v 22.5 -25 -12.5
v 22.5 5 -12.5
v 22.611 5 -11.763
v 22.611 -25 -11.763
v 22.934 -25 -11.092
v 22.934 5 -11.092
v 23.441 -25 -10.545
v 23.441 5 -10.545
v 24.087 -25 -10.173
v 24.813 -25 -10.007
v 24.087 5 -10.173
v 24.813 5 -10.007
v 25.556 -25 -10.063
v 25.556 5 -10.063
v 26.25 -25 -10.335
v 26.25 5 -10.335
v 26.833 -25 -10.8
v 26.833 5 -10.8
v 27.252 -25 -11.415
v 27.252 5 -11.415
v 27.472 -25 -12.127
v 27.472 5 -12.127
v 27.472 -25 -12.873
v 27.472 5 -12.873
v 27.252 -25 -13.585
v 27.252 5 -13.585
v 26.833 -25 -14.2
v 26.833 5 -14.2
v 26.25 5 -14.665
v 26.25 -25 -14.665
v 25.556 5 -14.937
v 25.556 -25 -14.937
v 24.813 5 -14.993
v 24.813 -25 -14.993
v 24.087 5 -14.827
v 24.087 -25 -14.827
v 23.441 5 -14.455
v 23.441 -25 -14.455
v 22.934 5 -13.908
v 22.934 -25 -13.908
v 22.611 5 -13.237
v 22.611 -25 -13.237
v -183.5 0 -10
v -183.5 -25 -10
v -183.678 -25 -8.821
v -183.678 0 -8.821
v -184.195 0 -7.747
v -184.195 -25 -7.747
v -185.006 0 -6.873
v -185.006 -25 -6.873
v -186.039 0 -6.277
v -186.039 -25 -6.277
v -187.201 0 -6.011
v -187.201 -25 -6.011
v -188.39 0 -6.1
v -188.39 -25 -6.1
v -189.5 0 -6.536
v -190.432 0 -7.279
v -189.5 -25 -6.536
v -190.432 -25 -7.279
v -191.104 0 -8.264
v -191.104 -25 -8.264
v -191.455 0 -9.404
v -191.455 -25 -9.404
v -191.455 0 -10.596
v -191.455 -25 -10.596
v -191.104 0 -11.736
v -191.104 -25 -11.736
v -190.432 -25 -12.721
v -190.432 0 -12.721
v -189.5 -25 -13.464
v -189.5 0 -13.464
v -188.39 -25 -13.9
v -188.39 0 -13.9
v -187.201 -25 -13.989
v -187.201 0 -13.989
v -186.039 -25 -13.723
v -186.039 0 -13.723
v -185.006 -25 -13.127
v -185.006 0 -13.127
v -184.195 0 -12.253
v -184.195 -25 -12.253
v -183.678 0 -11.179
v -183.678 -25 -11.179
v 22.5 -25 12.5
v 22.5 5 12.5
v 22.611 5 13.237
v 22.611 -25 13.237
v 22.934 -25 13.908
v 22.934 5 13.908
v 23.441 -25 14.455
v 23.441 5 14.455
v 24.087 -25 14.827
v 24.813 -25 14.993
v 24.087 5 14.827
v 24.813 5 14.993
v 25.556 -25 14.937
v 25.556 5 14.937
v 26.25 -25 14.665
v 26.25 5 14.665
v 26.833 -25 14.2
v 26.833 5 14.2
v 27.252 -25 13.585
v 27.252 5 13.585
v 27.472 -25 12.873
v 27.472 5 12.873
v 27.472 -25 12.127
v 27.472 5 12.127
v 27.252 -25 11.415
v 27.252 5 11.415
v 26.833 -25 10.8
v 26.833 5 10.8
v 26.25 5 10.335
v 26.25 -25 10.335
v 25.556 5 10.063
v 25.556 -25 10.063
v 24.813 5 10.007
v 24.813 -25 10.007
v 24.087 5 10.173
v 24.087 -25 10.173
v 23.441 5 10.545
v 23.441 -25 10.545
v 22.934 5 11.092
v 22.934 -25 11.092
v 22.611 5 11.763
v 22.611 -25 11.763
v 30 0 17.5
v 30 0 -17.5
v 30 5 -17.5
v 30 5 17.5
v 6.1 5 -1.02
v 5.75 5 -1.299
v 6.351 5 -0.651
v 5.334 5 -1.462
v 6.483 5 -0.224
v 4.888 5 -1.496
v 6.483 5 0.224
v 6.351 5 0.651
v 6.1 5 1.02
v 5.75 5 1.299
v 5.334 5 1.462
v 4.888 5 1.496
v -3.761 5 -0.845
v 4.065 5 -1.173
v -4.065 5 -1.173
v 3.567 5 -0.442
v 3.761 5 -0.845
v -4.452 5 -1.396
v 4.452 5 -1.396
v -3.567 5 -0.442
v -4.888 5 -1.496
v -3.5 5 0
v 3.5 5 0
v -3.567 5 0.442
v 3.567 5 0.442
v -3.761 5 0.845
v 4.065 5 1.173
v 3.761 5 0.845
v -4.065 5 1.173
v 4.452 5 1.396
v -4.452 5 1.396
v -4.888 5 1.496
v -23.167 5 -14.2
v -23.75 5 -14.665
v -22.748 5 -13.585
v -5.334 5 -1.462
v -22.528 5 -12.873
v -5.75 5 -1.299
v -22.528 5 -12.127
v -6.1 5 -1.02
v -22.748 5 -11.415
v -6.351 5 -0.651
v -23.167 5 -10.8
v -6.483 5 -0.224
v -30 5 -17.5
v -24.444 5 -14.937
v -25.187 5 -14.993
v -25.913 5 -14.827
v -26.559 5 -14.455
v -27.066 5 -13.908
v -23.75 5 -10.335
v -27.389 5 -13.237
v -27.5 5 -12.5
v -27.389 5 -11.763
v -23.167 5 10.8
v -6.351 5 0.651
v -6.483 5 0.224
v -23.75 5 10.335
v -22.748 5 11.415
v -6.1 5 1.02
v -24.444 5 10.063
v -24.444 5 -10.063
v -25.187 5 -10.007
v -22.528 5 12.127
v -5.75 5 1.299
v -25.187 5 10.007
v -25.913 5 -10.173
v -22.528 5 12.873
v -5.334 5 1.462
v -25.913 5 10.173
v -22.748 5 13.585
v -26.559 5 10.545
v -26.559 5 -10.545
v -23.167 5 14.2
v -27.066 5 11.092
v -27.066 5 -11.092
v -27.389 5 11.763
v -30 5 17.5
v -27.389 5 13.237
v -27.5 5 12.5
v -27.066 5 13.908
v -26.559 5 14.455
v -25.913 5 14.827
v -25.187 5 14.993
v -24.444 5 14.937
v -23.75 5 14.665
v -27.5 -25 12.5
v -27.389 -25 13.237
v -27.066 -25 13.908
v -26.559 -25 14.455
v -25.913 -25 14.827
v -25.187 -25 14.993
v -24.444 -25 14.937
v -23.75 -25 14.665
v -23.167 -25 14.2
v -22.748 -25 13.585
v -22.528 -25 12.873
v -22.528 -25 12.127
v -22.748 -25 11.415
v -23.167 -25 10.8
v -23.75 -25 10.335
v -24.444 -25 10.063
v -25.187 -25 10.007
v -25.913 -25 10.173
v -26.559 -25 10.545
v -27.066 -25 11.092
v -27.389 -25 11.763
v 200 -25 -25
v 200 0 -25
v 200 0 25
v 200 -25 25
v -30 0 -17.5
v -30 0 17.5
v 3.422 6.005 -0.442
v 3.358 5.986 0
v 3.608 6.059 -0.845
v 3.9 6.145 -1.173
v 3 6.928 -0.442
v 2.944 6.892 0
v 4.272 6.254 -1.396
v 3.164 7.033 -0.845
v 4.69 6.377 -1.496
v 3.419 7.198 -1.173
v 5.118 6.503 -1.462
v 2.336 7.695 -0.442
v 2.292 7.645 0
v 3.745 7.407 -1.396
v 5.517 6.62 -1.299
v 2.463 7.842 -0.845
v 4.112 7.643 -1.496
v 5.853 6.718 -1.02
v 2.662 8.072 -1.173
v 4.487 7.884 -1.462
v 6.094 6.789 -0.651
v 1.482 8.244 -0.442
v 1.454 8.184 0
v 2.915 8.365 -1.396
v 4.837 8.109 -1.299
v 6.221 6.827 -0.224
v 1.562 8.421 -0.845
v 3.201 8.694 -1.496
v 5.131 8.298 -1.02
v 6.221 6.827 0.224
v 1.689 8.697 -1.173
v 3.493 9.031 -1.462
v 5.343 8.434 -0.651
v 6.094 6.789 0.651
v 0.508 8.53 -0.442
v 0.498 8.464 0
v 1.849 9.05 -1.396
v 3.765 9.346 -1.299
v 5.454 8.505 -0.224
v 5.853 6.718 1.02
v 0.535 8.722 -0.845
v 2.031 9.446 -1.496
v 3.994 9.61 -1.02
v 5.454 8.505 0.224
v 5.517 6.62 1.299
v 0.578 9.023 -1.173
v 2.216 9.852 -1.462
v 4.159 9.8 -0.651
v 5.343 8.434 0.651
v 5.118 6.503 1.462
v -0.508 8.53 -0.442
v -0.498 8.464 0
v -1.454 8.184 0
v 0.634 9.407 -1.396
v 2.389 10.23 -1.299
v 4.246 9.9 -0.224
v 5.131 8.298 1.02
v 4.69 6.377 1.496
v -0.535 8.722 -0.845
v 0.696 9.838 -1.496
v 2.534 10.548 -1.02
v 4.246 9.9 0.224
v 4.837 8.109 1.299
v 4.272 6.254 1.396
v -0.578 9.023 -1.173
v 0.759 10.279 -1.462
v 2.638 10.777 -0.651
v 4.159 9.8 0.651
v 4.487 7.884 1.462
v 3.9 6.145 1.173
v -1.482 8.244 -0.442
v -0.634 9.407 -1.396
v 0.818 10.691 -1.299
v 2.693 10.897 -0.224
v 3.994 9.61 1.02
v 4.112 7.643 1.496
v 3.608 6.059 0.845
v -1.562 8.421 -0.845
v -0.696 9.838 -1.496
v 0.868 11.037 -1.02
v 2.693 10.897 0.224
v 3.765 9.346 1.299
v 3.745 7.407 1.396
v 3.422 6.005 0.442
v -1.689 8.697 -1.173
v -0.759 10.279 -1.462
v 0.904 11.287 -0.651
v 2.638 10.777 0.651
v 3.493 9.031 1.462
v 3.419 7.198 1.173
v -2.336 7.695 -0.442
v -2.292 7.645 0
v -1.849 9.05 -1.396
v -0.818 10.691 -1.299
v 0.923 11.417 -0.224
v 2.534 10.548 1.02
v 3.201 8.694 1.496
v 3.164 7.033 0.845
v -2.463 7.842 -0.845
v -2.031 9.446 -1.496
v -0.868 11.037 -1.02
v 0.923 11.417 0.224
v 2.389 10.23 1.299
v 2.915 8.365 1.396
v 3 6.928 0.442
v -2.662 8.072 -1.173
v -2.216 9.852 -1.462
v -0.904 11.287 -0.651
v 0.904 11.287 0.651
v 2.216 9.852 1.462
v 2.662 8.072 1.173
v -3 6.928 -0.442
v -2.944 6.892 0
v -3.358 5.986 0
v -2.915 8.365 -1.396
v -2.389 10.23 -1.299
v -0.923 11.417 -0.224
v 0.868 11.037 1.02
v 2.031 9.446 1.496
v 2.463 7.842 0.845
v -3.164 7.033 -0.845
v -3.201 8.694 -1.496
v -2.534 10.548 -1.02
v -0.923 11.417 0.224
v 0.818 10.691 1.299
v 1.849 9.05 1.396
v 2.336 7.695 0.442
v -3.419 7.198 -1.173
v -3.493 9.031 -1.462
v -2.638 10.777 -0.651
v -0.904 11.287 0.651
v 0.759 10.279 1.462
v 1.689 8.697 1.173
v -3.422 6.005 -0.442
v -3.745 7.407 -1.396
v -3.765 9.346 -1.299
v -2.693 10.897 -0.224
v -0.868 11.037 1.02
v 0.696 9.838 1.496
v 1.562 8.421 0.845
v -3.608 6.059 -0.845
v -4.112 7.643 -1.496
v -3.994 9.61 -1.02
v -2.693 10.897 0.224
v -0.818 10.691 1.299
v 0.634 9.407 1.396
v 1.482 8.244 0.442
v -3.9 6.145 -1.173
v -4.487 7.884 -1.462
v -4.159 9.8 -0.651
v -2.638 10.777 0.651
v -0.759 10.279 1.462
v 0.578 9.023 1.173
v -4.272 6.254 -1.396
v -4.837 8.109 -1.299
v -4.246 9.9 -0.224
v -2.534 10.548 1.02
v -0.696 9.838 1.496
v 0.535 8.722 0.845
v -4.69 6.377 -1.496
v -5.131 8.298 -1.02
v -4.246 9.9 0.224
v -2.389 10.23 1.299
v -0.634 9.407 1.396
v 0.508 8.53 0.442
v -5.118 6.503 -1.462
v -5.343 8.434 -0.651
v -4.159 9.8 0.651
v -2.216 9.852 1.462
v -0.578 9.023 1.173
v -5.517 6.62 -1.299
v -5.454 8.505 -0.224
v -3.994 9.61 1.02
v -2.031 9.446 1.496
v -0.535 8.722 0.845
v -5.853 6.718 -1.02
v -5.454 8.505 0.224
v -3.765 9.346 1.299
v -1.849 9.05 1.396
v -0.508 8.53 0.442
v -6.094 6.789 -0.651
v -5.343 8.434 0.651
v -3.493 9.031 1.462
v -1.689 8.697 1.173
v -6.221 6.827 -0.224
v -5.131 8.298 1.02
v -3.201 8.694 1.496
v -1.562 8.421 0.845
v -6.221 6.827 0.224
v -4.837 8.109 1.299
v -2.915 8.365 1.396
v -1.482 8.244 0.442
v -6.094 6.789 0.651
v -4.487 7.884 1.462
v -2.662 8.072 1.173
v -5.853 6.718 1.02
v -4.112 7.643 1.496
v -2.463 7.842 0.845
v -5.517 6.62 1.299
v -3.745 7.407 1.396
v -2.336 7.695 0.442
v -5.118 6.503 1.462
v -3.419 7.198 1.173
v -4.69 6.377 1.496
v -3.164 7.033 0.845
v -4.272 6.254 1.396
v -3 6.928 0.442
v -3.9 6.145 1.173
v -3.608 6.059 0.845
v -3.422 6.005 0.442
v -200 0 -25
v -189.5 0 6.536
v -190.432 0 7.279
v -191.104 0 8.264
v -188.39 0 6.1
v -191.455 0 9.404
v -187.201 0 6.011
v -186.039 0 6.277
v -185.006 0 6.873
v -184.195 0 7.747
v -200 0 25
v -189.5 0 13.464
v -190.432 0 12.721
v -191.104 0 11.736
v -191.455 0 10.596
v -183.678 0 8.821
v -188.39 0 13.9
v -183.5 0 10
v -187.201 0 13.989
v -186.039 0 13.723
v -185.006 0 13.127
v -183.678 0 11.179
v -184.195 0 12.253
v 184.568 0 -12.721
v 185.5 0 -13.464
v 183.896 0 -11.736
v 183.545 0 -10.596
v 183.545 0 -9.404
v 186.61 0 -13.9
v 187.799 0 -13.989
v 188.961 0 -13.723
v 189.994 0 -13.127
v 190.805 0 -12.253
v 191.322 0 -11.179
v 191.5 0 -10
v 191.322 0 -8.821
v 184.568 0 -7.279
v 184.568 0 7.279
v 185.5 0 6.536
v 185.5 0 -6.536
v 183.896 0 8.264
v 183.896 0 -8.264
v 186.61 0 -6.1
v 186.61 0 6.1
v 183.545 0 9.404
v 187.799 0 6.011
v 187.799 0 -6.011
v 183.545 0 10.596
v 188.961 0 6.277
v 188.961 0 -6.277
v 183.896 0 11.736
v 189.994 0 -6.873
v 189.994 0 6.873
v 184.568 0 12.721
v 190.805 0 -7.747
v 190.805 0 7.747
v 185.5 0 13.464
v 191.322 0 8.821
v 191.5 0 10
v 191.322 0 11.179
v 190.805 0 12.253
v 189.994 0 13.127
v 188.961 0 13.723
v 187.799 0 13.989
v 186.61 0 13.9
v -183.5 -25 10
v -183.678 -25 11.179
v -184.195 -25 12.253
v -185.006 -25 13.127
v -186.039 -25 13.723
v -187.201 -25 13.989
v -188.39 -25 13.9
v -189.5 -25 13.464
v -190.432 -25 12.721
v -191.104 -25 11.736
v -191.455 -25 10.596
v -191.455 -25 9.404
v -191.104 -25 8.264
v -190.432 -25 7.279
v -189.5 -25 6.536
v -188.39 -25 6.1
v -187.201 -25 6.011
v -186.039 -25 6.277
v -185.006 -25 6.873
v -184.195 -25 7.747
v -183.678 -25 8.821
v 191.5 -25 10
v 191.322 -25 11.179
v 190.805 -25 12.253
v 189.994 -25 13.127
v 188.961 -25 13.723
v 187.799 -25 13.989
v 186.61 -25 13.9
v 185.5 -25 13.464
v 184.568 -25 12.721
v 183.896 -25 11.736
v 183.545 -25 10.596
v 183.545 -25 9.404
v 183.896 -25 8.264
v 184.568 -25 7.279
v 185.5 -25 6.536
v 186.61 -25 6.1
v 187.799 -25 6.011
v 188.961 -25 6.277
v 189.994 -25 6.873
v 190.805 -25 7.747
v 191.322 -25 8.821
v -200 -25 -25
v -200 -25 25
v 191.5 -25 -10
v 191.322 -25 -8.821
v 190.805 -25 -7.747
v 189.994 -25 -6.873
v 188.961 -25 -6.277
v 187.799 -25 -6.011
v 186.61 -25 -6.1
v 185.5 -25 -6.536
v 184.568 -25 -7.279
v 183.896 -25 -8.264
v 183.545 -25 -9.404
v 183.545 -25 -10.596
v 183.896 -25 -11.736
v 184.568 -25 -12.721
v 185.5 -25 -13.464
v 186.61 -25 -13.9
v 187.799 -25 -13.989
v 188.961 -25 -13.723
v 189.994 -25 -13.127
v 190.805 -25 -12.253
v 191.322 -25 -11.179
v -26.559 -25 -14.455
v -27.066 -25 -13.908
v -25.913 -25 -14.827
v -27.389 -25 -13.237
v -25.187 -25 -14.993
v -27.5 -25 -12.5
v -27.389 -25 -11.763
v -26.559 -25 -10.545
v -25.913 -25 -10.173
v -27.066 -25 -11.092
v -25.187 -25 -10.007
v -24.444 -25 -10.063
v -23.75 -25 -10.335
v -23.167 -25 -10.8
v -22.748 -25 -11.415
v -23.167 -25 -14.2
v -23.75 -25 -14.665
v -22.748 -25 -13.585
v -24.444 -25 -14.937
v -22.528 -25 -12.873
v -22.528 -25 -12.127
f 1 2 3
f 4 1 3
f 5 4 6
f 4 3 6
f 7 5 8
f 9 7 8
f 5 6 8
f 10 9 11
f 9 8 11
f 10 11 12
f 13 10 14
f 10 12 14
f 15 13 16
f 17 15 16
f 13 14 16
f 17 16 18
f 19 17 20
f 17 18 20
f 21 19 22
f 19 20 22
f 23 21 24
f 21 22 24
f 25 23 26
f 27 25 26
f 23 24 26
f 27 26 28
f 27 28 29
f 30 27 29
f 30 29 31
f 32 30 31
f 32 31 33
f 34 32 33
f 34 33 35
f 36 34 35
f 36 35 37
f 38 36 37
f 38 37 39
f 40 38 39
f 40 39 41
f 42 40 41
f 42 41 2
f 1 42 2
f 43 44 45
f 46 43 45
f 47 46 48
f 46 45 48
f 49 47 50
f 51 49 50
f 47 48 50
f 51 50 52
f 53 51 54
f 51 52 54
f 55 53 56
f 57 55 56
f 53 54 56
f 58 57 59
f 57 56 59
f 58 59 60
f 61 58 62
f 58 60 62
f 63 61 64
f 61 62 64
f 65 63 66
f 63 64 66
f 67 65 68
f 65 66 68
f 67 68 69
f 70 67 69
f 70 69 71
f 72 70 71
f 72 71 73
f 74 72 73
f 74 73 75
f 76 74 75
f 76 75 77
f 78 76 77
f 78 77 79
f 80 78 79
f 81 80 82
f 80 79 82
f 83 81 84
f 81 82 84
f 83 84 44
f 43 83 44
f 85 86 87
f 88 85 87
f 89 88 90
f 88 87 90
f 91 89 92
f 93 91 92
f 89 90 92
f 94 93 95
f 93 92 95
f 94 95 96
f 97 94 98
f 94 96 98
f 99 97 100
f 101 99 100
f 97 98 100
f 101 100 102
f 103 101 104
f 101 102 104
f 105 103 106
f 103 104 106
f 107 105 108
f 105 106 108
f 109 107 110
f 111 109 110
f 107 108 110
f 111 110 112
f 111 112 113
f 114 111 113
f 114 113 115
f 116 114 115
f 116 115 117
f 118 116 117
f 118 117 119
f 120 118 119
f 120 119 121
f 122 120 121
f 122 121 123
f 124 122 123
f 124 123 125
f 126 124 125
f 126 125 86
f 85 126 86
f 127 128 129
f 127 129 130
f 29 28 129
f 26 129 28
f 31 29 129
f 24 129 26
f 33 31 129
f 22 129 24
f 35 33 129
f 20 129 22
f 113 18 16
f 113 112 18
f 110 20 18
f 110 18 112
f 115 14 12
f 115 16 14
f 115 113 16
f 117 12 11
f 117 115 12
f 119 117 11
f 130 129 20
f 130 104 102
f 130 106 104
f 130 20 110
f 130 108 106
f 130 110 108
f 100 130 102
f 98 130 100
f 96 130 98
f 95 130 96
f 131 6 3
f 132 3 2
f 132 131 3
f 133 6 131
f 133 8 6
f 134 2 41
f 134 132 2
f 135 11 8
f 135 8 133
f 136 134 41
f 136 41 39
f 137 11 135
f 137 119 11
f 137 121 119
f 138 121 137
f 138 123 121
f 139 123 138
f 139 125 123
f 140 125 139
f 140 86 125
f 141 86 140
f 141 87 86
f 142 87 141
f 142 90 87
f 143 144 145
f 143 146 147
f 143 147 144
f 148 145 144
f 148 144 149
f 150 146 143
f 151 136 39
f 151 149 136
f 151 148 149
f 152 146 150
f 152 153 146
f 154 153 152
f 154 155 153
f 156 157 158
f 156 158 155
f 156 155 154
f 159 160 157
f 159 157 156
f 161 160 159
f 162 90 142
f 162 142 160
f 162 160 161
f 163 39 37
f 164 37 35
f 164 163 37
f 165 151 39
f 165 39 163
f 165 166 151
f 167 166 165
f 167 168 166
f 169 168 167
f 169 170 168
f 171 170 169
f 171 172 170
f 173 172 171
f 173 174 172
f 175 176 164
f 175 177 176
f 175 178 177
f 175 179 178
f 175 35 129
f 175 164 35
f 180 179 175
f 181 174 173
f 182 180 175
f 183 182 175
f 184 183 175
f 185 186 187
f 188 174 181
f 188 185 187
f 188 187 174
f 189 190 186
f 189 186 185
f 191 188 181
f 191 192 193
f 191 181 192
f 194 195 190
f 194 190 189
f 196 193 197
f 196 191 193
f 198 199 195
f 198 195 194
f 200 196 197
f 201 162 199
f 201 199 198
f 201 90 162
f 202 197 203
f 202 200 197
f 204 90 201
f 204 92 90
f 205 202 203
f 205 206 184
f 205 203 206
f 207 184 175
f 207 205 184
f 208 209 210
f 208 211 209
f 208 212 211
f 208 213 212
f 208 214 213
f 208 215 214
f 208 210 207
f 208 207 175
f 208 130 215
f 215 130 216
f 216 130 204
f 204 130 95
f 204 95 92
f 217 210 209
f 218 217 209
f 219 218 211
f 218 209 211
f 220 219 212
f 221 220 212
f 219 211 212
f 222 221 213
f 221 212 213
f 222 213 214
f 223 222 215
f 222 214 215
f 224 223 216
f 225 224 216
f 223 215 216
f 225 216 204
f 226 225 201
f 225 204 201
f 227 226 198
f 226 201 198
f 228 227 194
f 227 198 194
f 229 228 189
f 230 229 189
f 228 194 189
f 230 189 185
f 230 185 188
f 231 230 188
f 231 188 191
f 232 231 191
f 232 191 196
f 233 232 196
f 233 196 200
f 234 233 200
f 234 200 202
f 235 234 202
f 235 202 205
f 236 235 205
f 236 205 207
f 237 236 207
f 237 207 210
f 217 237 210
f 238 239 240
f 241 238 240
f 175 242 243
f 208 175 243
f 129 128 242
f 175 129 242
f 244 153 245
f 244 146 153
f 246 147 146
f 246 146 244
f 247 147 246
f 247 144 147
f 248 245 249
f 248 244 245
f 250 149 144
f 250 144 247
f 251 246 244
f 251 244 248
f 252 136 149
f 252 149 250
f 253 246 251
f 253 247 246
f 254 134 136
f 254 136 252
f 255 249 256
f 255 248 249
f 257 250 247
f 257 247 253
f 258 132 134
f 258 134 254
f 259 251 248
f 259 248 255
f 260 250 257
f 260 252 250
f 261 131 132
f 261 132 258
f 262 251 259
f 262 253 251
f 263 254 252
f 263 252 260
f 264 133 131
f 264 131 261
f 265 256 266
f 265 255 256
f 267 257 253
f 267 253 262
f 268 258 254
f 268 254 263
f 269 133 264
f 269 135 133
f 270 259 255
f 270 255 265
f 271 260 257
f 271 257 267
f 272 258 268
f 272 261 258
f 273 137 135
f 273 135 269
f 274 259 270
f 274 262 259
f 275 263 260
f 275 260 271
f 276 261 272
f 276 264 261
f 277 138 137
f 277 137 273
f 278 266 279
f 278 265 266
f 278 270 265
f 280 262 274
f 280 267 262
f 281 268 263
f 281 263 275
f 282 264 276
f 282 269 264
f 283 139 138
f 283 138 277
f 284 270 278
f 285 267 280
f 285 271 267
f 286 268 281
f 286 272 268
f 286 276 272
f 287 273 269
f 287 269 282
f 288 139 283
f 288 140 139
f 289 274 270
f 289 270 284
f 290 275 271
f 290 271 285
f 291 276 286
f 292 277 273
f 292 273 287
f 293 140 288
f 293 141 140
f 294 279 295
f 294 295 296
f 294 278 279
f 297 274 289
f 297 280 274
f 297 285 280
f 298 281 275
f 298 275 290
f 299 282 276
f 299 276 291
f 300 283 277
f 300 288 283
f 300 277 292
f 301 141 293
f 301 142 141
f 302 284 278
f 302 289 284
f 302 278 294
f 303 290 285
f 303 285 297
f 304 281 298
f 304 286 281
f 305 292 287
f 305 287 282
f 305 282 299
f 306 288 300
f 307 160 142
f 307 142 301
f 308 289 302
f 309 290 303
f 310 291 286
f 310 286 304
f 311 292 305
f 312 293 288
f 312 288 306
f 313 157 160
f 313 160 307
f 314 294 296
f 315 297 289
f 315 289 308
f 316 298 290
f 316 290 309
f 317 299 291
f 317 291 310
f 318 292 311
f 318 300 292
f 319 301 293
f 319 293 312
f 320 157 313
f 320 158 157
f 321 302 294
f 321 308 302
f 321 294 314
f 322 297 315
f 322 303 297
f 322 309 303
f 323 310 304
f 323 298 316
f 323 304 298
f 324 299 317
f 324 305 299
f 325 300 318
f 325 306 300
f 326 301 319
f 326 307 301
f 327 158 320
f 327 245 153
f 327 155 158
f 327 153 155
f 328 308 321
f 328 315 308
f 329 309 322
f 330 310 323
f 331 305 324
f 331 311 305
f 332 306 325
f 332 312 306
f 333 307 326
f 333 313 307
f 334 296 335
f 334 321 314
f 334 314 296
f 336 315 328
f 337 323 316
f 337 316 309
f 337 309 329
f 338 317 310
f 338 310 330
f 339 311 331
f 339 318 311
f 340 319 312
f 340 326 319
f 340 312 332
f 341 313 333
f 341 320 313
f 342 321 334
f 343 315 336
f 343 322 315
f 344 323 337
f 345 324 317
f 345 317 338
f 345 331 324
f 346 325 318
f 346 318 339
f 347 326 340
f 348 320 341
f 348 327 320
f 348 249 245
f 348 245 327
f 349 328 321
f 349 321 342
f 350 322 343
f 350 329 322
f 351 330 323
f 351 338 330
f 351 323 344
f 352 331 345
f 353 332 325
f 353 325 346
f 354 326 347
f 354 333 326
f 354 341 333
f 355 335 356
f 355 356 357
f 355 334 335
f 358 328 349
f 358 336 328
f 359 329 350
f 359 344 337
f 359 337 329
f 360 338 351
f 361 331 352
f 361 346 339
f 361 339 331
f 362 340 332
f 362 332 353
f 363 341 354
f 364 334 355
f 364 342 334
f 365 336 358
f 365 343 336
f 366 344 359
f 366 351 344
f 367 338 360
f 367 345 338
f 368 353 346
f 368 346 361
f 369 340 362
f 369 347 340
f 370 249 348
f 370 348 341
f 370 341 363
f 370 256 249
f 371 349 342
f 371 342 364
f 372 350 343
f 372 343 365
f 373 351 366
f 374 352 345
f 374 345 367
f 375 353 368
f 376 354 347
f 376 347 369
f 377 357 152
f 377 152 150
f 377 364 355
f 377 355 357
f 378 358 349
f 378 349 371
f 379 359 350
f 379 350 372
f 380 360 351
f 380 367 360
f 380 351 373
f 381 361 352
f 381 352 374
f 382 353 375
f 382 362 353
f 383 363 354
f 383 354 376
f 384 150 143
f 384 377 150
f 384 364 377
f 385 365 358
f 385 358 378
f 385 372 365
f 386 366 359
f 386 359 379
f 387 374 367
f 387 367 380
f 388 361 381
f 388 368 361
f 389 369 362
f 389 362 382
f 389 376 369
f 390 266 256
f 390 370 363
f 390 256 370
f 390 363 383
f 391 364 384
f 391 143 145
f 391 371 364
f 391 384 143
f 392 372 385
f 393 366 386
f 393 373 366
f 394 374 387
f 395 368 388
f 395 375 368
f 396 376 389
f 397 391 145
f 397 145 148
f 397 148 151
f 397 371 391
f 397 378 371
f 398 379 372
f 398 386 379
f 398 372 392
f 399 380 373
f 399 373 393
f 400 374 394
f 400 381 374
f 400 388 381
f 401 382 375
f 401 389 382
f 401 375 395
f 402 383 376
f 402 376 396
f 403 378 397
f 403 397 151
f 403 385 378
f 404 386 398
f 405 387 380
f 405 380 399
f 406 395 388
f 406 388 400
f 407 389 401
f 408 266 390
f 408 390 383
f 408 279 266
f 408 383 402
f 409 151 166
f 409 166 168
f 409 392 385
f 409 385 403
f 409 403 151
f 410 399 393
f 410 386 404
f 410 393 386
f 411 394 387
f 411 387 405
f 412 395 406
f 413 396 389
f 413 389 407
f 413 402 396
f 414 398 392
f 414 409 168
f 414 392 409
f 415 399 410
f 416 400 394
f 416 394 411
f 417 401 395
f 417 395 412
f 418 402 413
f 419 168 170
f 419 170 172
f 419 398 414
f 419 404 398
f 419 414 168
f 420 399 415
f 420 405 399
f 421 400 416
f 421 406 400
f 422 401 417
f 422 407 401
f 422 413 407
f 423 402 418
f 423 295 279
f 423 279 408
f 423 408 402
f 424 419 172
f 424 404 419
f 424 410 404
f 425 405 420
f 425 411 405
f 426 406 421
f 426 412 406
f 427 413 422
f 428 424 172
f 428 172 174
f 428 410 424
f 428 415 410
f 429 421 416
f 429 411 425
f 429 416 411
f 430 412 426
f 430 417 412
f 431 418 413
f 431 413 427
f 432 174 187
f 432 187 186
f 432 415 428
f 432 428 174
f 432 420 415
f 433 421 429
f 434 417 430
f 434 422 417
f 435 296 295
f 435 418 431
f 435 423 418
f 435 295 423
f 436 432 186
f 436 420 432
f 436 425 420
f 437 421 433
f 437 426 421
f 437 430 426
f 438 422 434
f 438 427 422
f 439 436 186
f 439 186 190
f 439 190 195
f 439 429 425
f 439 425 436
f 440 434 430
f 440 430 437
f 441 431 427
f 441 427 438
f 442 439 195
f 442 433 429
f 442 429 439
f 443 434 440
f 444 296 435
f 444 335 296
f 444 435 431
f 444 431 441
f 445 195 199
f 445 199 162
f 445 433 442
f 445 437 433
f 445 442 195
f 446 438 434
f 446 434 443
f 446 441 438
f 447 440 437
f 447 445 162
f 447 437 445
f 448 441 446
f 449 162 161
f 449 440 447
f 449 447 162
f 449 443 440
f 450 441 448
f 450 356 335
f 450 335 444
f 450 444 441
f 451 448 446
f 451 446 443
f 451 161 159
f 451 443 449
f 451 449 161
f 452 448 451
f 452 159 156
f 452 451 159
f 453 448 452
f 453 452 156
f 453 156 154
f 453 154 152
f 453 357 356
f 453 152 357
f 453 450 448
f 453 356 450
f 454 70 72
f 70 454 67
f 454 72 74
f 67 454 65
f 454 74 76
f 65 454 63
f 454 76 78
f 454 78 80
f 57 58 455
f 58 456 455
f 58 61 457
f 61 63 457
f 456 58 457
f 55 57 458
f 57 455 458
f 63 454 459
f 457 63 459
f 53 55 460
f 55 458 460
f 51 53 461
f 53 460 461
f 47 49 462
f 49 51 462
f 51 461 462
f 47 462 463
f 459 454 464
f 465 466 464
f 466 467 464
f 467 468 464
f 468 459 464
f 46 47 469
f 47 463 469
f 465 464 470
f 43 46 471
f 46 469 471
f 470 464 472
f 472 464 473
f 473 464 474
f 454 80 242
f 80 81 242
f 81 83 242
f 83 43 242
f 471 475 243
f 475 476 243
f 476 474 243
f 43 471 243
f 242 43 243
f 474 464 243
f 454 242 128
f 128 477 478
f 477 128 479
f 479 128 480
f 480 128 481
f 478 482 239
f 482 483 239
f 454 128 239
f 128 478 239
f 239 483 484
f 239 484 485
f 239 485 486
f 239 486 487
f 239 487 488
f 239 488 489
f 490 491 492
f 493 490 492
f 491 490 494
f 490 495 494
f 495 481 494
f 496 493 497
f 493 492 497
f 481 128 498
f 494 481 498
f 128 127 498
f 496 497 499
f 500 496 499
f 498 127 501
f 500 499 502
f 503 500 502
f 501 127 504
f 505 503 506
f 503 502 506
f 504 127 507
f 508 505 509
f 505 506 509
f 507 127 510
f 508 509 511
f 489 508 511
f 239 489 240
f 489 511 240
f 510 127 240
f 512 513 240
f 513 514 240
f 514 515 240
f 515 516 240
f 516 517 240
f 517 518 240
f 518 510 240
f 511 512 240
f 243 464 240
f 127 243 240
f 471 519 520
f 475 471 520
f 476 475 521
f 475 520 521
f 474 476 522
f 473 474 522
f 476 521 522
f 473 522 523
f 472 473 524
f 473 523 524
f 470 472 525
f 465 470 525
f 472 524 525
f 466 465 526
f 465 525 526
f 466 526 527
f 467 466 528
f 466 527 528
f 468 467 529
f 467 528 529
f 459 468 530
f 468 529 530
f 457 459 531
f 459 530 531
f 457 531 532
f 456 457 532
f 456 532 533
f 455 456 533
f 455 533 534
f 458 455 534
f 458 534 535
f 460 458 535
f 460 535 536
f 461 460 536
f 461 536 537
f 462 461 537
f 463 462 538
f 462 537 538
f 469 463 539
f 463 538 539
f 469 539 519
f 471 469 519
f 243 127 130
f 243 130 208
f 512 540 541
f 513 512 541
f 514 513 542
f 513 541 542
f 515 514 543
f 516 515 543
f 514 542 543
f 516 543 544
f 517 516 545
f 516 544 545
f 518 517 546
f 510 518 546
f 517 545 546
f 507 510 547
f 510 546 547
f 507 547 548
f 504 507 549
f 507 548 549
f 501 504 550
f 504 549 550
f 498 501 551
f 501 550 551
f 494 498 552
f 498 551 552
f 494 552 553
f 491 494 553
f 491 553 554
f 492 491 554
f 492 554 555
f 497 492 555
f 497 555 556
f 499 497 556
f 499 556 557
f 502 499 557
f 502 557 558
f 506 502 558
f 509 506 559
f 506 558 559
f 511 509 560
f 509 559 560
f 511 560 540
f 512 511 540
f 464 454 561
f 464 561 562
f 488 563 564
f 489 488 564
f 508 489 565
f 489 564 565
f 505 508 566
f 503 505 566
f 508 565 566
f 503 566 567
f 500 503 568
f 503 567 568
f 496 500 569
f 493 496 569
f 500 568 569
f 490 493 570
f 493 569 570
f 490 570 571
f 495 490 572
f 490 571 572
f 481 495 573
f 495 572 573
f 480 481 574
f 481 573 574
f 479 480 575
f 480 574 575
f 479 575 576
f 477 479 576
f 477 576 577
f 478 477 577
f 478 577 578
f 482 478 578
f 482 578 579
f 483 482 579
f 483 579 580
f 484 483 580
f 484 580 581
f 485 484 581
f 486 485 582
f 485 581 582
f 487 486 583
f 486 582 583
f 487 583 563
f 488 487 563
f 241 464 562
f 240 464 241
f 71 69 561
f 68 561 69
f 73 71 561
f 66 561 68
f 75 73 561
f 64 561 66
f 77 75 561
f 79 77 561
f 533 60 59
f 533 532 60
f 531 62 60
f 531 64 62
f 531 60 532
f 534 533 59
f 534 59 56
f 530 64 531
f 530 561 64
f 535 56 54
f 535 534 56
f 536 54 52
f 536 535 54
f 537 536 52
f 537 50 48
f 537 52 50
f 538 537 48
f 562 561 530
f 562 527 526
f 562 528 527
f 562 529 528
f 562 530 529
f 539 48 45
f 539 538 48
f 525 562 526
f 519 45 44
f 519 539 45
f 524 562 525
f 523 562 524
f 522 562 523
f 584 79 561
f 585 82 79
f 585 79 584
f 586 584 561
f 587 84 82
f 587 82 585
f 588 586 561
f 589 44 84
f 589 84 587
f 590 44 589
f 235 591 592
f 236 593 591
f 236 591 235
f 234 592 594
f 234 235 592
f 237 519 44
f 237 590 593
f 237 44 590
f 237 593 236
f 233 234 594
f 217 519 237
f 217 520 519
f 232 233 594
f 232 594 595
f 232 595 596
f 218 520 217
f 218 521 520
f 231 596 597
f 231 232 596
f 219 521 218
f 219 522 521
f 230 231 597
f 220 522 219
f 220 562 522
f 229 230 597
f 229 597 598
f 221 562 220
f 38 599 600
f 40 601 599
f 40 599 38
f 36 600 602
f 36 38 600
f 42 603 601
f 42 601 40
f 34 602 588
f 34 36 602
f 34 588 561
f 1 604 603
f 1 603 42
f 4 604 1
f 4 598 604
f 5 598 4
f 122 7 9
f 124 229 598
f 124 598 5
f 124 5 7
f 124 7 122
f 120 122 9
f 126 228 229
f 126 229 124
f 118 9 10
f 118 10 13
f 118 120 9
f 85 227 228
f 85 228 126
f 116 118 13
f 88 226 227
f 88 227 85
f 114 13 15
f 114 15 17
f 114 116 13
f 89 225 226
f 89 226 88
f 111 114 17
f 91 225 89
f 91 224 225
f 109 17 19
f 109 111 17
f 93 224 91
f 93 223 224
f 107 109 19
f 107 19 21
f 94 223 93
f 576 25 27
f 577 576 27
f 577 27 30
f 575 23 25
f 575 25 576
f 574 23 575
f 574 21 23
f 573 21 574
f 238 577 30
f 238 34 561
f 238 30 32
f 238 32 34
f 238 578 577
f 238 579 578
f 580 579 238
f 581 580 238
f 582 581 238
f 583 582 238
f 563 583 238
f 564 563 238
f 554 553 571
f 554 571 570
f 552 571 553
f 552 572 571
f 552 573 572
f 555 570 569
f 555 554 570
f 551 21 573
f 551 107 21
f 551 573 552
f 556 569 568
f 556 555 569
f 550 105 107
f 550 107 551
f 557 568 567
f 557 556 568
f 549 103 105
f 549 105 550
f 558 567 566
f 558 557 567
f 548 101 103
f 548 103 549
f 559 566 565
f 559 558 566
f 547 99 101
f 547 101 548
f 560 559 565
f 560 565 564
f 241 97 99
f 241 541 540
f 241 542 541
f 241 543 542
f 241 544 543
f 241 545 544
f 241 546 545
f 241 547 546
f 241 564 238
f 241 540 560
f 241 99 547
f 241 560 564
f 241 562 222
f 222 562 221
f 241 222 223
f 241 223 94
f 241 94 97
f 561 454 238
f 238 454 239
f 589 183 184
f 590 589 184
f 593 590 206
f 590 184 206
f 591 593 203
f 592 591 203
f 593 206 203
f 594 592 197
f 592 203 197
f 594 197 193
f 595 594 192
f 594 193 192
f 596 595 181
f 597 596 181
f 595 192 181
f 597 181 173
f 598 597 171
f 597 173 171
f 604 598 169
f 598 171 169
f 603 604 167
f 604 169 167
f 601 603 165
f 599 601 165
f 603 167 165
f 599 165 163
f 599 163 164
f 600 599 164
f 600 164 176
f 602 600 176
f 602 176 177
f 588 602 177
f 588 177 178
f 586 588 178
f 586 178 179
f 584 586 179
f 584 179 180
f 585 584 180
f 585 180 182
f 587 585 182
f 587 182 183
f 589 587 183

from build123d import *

# Parameters (mm, degrees)
F0_W     = 400
F0_H     = 50
F1_DEPTH = 25
F2_R     = 4
F3_DEPTH = 25
F4_W     = 60
F4_H     = 35
F5_DEPTH = 5
F6_R     = 2.5
F7_DEPTH = 30.001
F8_R     = 1.5


with BuildPart() as f1:
    # F0 (on Front) → F1 (new body)
    with BuildSketch(Plane.XZ):
        Rectangle(F0_W, F0_H)
    extrude(amount=F1_DEPTH)

    # F2 (on face) → F3 (cut, through all)
    with BuildSketch(Plane.XZ.offset(25)):
        with Locations((-187.5, 10)):
            Circle(F2_R)
        with Locations((-187.5, -10)):
            Circle(F2_R)
        with Locations((187.5, 10)):
            Circle(F2_R)
        with Locations((187.5, -10)):
            Circle(F2_R)
    extrude(amount=-F3_DEPTH, mode=Mode.SUBTRACT)

    # F4 (on face) → F5 (join)
    with BuildSketch(Plane(origin=(0, 0, 0), x_dir=(-1, 0, 0), z_dir=(0, 1, 0))):
        Rectangle(F4_W, F4_H)
    extrude(amount=F5_DEPTH)

    # F6 (on face) → F7 (cut, through all)
    with BuildSketch(Plane(origin=(0, 5, 0), x_dir=(-1, 0, 0), z_dir=(0, 1, 0))):
        with Locations((-25, 12.5)):
            Circle(F6_R)
        with Locations((25, 12.5)):
            Circle(F6_R)
        with Locations((25, -12.5)):
            Circle(F6_R)
        with Locations((-25, -12.5)):
            Circle(F6_R)
    extrude(amount=-F7_DEPTH, mode=Mode.SUBTRACT)

    # F11: sweep along a path in F10
    with BuildLine(Plane.XY) as f11_path:
        ThreePointArc((5, 5), (0, 10), (-5, 5))
    # F8 (on face) → F11 (sweep)
    with BuildSketch(Plane(origin=(0, 5, 0), x_dir=(-1, 0, 0), z_dir=(0, 1, 0))):
        with Locations((-5, 0)):
            Circle(F8_R)
    sweep(path=f11_path.line)


solid = f1.part
